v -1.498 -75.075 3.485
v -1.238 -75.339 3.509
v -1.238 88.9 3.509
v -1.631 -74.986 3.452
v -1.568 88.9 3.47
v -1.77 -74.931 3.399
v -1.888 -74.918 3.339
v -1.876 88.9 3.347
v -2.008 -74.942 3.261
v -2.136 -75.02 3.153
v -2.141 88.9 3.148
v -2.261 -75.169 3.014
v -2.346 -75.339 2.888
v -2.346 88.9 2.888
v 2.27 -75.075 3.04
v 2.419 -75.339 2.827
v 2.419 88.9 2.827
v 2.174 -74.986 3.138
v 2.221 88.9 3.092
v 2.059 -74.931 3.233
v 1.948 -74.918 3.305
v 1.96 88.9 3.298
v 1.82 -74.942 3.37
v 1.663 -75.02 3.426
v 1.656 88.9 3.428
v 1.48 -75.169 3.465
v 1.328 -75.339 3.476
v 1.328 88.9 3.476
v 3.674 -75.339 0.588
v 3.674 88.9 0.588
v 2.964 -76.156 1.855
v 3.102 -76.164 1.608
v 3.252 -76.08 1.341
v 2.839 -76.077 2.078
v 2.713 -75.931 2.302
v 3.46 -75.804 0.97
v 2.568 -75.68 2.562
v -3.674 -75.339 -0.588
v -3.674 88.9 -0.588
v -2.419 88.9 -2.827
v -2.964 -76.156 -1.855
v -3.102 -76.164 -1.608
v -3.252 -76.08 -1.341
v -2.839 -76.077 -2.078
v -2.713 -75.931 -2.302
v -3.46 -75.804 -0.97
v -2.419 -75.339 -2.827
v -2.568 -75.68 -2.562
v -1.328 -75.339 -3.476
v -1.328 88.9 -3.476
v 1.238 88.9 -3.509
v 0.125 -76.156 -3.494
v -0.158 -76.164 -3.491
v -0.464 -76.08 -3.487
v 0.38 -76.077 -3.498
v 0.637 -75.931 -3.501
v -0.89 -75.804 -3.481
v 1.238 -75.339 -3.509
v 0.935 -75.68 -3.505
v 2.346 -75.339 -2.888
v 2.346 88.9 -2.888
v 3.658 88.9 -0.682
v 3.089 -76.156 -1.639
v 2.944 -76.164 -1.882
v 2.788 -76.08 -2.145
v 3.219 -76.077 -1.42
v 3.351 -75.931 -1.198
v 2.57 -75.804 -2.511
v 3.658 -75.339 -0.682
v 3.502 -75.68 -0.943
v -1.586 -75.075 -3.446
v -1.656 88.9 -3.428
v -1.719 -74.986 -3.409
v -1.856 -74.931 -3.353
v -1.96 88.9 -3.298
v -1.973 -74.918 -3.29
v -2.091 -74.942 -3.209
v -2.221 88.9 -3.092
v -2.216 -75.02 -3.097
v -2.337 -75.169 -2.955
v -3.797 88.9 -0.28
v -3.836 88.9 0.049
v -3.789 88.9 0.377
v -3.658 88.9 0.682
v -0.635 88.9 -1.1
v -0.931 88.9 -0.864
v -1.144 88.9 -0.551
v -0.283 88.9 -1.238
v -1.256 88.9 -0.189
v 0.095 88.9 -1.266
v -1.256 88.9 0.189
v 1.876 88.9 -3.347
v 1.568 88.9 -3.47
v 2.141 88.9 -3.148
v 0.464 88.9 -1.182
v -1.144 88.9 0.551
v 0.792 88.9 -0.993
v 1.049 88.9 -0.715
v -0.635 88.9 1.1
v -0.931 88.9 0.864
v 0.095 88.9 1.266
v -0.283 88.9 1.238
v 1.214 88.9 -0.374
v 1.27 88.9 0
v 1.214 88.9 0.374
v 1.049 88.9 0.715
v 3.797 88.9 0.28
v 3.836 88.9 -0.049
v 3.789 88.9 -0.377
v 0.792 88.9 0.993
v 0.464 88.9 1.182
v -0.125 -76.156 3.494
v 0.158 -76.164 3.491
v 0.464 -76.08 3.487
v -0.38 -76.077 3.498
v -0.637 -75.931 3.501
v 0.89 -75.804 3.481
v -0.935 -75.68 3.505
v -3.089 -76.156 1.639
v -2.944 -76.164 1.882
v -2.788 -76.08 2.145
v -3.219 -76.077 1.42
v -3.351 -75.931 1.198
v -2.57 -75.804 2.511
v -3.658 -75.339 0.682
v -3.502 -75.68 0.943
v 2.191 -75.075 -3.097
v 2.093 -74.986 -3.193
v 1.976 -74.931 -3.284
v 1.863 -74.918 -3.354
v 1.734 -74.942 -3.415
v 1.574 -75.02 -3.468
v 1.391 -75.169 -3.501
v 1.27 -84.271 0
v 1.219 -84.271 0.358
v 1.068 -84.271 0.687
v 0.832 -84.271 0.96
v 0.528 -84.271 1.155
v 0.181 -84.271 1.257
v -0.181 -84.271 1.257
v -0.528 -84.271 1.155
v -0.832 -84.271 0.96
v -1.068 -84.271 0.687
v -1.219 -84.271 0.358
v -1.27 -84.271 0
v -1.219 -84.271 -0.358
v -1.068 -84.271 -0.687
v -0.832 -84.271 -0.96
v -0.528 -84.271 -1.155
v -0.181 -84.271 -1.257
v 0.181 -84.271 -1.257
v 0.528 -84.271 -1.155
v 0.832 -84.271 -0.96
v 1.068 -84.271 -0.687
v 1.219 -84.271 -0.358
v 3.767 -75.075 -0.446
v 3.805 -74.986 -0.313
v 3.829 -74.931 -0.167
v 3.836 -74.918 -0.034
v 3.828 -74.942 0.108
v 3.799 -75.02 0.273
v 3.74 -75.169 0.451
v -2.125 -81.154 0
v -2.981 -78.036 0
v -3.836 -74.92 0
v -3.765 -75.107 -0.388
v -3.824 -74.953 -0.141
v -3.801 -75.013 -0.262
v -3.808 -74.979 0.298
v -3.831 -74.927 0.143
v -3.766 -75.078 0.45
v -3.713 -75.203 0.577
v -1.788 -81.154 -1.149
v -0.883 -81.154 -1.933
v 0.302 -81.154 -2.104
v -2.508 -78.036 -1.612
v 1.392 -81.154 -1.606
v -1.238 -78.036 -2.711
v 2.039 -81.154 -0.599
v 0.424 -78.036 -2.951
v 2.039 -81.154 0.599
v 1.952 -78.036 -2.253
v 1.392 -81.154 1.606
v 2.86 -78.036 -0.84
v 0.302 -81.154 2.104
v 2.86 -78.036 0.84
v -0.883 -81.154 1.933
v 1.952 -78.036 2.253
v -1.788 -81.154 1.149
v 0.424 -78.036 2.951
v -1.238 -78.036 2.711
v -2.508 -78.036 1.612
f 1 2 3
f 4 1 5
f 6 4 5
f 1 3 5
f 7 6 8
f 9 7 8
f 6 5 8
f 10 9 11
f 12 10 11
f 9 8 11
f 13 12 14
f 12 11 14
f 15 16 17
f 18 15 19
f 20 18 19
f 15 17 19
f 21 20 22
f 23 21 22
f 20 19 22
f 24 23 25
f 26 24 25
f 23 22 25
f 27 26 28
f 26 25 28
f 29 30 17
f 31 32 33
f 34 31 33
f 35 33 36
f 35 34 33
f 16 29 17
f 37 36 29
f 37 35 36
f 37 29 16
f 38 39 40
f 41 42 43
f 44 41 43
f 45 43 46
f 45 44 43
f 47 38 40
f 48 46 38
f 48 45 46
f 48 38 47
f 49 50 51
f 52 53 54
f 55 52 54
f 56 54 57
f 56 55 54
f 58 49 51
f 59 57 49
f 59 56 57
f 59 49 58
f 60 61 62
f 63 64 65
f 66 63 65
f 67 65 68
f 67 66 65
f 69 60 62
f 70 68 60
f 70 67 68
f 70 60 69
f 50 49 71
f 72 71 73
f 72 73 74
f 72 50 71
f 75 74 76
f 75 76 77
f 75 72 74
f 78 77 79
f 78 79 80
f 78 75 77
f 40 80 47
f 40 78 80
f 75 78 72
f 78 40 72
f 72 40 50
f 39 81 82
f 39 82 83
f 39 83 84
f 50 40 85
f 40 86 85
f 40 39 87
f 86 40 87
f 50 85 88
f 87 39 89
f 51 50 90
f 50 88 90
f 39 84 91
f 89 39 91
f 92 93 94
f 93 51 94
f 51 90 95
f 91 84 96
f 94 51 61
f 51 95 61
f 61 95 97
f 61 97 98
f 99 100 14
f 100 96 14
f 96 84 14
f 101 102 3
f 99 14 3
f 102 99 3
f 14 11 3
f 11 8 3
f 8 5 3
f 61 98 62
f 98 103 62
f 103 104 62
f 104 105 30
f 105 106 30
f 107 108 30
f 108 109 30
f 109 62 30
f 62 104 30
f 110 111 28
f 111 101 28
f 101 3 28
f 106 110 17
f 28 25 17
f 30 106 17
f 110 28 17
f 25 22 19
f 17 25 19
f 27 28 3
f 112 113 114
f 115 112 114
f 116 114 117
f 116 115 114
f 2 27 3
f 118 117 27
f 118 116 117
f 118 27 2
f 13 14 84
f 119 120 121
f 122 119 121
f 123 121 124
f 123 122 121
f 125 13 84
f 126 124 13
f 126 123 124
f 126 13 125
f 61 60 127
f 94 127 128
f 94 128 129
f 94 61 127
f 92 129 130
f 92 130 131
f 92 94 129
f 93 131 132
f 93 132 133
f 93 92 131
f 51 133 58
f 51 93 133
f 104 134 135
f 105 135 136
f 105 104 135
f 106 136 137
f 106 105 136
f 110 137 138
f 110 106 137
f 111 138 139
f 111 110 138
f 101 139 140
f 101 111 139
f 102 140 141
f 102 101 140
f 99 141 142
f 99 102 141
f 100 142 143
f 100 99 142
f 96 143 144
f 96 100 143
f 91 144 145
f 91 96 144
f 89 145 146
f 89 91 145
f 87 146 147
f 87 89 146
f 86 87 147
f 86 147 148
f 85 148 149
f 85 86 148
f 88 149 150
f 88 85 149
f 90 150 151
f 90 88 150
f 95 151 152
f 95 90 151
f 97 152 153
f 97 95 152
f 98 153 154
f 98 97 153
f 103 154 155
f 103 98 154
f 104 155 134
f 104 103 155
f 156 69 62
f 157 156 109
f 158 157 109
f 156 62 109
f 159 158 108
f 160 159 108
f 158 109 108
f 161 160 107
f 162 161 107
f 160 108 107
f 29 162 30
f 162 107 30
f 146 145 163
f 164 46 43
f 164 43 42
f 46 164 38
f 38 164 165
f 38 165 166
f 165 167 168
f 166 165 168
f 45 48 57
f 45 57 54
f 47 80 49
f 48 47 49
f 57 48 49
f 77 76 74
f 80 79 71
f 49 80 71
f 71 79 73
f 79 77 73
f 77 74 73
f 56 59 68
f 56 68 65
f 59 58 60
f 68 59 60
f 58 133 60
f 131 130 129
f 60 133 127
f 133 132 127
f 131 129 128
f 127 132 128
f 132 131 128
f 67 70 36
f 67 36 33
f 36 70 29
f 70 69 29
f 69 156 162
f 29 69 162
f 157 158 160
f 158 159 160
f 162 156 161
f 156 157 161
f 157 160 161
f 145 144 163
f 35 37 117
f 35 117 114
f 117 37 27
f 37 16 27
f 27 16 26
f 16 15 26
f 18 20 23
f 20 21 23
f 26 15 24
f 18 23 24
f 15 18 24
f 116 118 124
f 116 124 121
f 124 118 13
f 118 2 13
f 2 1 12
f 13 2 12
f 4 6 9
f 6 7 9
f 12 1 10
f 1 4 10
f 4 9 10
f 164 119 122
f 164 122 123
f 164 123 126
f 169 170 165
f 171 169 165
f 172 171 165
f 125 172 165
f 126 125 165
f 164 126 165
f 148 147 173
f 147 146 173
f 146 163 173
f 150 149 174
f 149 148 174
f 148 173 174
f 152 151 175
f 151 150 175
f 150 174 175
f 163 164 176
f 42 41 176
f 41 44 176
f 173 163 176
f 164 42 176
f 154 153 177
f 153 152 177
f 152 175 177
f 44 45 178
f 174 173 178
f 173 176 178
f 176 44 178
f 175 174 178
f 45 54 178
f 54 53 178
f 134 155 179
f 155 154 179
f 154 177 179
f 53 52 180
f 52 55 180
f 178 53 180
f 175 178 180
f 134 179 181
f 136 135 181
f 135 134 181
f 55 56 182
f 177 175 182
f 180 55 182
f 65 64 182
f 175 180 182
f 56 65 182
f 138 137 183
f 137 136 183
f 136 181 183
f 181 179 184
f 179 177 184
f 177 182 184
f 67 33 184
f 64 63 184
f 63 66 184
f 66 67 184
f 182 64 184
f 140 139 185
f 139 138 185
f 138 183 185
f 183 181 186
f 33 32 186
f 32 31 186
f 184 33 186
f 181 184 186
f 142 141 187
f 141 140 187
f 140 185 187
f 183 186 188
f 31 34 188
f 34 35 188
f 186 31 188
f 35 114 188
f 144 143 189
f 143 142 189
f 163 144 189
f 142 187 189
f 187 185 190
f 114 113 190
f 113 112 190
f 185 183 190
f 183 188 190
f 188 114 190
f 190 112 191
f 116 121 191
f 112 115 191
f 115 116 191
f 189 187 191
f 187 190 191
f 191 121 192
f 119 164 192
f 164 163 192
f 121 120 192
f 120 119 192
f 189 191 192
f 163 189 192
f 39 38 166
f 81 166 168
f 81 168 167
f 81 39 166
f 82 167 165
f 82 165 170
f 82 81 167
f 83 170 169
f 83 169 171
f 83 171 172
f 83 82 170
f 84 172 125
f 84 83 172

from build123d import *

# Parameters (mm, degrees)
F0_R        = 1.27
F1_DEPTH    = 88.9
F5_T1_DEPTH = 181.4661742094


# Not quite as in the source:
# - a fillet or chamfer that OpenCascade refuses, or shapes differently, is made with other operations: its cross-section is extruded or revolved along the edge and cut away or added


with BuildPart() as f1:
    # F0 (on Front) → F1 (new body, symmetric)
    with BuildSketch(Plane.XZ):
        Polygon((4.0324625191, -0.0515205351), (2.0608493518, 3.4664547138), (-1.9716131673, 3.5179752489), (-4.0324625191, 0.0515205351), (-2.0608493518, -3.4664547138), (1.9716131673, -3.5179752489), align=None)
        Circle(F0_R, mode=Mode.SUBTRACT)
    extrude(amount=F1_DEPTH, both=True)

    # F2 (on Top) → F4 (revolve, cut)
    with BuildSketch(Plane.XY):
        Polygon((0, -99.6820554137), (0, -88.9), (-4.0324625191, -74.2031688439), (-4.0324625191, -99.6820554137), align=None)
    revolve(axis=Axis((0, -76.0434828699, 0), (0, -1, 0)), mode=Mode.SUBTRACT)

    # F5: fillet of radius 1.27 on 6 edges, made by hand

    # F5_s2 → F5_t1 (cut)
    with BuildSketch(Plane.XZ.offset(-90.7330871047)):
        with BuildLine():
            ThreePointArc((2.4193244731, 2.8268228503), (1.960448821, 3.2975758517), (1.3276743483, 3.4758220838))
            Line((1.3276743483, 3.4758220838), (2.0608493518, 3.4664547138))
            Line((2.0608493518, 3.4664547138), (2.4193244731, 2.8268228503))
        make_face()
        with BuildLine():
            ThreePointArc((-1.2384381638, 3.5086078789), (-1.875560048, 3.3465864076), (-2.3463130494, 2.8877107555))
            Line((-2.3463130494, 2.8877107555), (-1.9716131673, 3.5179752489))
            Line((-1.9716131673, 3.5179752489), (-1.2384381638, 3.5086078789))
        make_face()
        with BuildLine():
            ThreePointArc((-3.6739873978, -0.5881113283), (-3.836008869, 0.0490105559), (-3.6577626369, 0.6817850286))
            Line((-3.6577626369, 0.6817850286), (-4.0324625191, 0.0515205351))
            Line((-4.0324625191, 0.0515205351), (-3.6739873978, -0.5881113283))
        make_face()
        with BuildLine():
            ThreePointArc((-1.3276743483, -3.4758220838), (-1.960448821, -3.2975758517), (-2.4193244731, -2.8268228503))
            Line((-2.4193244731, -2.8268228503), (-2.0608493518, -3.4664547138))
            Line((-2.0608493518, -3.4664547138), (-1.3276743483, -3.4758220838))
        make_face()
        with BuildLine():
            ThreePointArc((2.3463130494, -2.8877107555), (1.875560048, -3.3465864076), (1.2384381638, -3.5086078789))
            Line((1.2384381638, -3.5086078789), (1.9716131673, -3.5179752489))
            Line((1.9716131673, -3.5179752489), (2.3463130494, -2.8877107555))
        make_face()
        with BuildLine():
            ThreePointArc((3.6577626369, -0.6817850286), (3.836008869, -0.0490105559), (3.6739873978, 0.5881113283))
            Line((3.6739873978, 0.5881113283), (4.0324625191, -0.0515205351))
            Line((4.0324625191, -0.0515205351), (3.6577626369, -0.6817850286))
        make_face()
    extrude(amount=F5_T1_DEPTH, mode=Mode.SUBTRACT)


solid = f1.part
